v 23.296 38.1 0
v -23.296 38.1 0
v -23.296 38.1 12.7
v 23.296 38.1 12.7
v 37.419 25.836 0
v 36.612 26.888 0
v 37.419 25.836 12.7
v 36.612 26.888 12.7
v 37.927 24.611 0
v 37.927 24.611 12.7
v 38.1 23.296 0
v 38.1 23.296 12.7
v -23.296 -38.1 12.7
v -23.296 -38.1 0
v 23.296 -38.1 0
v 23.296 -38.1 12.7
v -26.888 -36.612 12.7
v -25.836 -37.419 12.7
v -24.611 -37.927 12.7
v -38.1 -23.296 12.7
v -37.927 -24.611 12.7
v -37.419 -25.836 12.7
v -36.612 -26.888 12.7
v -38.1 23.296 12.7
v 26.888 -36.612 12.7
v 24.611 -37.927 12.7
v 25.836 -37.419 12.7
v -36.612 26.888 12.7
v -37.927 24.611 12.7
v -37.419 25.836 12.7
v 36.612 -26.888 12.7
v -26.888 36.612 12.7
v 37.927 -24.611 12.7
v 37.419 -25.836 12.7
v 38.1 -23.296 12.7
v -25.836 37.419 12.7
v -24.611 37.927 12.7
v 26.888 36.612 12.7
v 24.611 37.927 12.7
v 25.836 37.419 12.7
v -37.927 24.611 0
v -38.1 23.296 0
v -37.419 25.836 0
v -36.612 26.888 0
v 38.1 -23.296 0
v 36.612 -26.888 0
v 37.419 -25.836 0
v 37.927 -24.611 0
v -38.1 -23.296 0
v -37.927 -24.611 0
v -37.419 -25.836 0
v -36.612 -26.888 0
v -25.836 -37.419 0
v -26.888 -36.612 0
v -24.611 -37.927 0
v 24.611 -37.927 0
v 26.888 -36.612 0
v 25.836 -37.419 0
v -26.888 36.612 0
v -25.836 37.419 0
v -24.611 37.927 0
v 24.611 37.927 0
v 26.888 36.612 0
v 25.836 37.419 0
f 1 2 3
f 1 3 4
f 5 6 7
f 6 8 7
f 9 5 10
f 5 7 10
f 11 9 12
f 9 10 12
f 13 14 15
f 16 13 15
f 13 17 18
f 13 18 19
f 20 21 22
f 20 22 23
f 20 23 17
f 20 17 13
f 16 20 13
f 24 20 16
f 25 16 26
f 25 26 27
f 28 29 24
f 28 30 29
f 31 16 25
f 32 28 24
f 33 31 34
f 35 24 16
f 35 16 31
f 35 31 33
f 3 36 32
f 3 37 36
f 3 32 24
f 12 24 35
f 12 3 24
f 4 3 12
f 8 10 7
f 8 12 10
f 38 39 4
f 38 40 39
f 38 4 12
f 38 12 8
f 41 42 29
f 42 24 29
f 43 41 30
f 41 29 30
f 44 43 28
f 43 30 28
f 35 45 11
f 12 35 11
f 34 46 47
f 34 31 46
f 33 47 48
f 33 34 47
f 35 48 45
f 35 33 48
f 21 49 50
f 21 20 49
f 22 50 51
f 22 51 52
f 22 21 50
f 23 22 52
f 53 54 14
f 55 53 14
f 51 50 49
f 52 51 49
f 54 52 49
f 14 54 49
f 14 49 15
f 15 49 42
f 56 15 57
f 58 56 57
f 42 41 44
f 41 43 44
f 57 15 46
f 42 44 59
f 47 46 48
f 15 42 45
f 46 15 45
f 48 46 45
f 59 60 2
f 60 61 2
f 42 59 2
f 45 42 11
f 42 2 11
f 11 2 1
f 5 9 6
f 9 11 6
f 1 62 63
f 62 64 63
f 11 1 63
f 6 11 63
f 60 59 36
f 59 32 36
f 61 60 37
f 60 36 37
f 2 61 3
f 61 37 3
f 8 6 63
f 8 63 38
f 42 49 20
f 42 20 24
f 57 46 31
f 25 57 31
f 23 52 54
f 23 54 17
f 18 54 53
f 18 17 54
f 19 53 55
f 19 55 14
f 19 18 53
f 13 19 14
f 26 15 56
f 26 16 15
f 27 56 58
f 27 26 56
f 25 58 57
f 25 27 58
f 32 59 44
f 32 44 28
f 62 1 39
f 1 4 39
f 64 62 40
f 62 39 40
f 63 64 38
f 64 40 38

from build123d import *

# Parameters (mm, degrees)
F0_W     = 76.2
F0_H     = 76.2
F1_DEPTH = 12.7
F2_SIZE  = 12.7
F3_R     = 5.08


with BuildPart() as f1:
    # F0 (on Top) → F1 (new body)
    with BuildSketch(Plane.XY):
        Rectangle(F0_W, F0_H)
    extrude(amount=F1_DEPTH)

    # F2
    f2_edges = [f1.edges().sort_by_distance(p)[0] for p in [
        (-38.1, -38.1, 6.35),
        (38.1, -38.1, 6.35),
        (-38.1, 38.1, 6.35),
        (38.1, 38.1, 6.35),
    ]]
    chamfer(f2_edges, length=F2_SIZE)

    # F3
    f3_edges = [f1.edges().sort_by_distance(p)[0] for p in [
        (25.4, -38.1, 6.35),
        (38.1, -25.4, 6.35),
        (38.1, 25.4, 6.35),
        (25.4, 38.1, 6.35),
        (-25.4, 38.1, 6.35),
        (-38.1, 25.4, 6.35),
        (-38.1, -25.4, 6.35),
        (-25.4, -38.1, 6.35),
    ]]
    fillet(f3_edges, radius=F3_R)


solid = f1.part
